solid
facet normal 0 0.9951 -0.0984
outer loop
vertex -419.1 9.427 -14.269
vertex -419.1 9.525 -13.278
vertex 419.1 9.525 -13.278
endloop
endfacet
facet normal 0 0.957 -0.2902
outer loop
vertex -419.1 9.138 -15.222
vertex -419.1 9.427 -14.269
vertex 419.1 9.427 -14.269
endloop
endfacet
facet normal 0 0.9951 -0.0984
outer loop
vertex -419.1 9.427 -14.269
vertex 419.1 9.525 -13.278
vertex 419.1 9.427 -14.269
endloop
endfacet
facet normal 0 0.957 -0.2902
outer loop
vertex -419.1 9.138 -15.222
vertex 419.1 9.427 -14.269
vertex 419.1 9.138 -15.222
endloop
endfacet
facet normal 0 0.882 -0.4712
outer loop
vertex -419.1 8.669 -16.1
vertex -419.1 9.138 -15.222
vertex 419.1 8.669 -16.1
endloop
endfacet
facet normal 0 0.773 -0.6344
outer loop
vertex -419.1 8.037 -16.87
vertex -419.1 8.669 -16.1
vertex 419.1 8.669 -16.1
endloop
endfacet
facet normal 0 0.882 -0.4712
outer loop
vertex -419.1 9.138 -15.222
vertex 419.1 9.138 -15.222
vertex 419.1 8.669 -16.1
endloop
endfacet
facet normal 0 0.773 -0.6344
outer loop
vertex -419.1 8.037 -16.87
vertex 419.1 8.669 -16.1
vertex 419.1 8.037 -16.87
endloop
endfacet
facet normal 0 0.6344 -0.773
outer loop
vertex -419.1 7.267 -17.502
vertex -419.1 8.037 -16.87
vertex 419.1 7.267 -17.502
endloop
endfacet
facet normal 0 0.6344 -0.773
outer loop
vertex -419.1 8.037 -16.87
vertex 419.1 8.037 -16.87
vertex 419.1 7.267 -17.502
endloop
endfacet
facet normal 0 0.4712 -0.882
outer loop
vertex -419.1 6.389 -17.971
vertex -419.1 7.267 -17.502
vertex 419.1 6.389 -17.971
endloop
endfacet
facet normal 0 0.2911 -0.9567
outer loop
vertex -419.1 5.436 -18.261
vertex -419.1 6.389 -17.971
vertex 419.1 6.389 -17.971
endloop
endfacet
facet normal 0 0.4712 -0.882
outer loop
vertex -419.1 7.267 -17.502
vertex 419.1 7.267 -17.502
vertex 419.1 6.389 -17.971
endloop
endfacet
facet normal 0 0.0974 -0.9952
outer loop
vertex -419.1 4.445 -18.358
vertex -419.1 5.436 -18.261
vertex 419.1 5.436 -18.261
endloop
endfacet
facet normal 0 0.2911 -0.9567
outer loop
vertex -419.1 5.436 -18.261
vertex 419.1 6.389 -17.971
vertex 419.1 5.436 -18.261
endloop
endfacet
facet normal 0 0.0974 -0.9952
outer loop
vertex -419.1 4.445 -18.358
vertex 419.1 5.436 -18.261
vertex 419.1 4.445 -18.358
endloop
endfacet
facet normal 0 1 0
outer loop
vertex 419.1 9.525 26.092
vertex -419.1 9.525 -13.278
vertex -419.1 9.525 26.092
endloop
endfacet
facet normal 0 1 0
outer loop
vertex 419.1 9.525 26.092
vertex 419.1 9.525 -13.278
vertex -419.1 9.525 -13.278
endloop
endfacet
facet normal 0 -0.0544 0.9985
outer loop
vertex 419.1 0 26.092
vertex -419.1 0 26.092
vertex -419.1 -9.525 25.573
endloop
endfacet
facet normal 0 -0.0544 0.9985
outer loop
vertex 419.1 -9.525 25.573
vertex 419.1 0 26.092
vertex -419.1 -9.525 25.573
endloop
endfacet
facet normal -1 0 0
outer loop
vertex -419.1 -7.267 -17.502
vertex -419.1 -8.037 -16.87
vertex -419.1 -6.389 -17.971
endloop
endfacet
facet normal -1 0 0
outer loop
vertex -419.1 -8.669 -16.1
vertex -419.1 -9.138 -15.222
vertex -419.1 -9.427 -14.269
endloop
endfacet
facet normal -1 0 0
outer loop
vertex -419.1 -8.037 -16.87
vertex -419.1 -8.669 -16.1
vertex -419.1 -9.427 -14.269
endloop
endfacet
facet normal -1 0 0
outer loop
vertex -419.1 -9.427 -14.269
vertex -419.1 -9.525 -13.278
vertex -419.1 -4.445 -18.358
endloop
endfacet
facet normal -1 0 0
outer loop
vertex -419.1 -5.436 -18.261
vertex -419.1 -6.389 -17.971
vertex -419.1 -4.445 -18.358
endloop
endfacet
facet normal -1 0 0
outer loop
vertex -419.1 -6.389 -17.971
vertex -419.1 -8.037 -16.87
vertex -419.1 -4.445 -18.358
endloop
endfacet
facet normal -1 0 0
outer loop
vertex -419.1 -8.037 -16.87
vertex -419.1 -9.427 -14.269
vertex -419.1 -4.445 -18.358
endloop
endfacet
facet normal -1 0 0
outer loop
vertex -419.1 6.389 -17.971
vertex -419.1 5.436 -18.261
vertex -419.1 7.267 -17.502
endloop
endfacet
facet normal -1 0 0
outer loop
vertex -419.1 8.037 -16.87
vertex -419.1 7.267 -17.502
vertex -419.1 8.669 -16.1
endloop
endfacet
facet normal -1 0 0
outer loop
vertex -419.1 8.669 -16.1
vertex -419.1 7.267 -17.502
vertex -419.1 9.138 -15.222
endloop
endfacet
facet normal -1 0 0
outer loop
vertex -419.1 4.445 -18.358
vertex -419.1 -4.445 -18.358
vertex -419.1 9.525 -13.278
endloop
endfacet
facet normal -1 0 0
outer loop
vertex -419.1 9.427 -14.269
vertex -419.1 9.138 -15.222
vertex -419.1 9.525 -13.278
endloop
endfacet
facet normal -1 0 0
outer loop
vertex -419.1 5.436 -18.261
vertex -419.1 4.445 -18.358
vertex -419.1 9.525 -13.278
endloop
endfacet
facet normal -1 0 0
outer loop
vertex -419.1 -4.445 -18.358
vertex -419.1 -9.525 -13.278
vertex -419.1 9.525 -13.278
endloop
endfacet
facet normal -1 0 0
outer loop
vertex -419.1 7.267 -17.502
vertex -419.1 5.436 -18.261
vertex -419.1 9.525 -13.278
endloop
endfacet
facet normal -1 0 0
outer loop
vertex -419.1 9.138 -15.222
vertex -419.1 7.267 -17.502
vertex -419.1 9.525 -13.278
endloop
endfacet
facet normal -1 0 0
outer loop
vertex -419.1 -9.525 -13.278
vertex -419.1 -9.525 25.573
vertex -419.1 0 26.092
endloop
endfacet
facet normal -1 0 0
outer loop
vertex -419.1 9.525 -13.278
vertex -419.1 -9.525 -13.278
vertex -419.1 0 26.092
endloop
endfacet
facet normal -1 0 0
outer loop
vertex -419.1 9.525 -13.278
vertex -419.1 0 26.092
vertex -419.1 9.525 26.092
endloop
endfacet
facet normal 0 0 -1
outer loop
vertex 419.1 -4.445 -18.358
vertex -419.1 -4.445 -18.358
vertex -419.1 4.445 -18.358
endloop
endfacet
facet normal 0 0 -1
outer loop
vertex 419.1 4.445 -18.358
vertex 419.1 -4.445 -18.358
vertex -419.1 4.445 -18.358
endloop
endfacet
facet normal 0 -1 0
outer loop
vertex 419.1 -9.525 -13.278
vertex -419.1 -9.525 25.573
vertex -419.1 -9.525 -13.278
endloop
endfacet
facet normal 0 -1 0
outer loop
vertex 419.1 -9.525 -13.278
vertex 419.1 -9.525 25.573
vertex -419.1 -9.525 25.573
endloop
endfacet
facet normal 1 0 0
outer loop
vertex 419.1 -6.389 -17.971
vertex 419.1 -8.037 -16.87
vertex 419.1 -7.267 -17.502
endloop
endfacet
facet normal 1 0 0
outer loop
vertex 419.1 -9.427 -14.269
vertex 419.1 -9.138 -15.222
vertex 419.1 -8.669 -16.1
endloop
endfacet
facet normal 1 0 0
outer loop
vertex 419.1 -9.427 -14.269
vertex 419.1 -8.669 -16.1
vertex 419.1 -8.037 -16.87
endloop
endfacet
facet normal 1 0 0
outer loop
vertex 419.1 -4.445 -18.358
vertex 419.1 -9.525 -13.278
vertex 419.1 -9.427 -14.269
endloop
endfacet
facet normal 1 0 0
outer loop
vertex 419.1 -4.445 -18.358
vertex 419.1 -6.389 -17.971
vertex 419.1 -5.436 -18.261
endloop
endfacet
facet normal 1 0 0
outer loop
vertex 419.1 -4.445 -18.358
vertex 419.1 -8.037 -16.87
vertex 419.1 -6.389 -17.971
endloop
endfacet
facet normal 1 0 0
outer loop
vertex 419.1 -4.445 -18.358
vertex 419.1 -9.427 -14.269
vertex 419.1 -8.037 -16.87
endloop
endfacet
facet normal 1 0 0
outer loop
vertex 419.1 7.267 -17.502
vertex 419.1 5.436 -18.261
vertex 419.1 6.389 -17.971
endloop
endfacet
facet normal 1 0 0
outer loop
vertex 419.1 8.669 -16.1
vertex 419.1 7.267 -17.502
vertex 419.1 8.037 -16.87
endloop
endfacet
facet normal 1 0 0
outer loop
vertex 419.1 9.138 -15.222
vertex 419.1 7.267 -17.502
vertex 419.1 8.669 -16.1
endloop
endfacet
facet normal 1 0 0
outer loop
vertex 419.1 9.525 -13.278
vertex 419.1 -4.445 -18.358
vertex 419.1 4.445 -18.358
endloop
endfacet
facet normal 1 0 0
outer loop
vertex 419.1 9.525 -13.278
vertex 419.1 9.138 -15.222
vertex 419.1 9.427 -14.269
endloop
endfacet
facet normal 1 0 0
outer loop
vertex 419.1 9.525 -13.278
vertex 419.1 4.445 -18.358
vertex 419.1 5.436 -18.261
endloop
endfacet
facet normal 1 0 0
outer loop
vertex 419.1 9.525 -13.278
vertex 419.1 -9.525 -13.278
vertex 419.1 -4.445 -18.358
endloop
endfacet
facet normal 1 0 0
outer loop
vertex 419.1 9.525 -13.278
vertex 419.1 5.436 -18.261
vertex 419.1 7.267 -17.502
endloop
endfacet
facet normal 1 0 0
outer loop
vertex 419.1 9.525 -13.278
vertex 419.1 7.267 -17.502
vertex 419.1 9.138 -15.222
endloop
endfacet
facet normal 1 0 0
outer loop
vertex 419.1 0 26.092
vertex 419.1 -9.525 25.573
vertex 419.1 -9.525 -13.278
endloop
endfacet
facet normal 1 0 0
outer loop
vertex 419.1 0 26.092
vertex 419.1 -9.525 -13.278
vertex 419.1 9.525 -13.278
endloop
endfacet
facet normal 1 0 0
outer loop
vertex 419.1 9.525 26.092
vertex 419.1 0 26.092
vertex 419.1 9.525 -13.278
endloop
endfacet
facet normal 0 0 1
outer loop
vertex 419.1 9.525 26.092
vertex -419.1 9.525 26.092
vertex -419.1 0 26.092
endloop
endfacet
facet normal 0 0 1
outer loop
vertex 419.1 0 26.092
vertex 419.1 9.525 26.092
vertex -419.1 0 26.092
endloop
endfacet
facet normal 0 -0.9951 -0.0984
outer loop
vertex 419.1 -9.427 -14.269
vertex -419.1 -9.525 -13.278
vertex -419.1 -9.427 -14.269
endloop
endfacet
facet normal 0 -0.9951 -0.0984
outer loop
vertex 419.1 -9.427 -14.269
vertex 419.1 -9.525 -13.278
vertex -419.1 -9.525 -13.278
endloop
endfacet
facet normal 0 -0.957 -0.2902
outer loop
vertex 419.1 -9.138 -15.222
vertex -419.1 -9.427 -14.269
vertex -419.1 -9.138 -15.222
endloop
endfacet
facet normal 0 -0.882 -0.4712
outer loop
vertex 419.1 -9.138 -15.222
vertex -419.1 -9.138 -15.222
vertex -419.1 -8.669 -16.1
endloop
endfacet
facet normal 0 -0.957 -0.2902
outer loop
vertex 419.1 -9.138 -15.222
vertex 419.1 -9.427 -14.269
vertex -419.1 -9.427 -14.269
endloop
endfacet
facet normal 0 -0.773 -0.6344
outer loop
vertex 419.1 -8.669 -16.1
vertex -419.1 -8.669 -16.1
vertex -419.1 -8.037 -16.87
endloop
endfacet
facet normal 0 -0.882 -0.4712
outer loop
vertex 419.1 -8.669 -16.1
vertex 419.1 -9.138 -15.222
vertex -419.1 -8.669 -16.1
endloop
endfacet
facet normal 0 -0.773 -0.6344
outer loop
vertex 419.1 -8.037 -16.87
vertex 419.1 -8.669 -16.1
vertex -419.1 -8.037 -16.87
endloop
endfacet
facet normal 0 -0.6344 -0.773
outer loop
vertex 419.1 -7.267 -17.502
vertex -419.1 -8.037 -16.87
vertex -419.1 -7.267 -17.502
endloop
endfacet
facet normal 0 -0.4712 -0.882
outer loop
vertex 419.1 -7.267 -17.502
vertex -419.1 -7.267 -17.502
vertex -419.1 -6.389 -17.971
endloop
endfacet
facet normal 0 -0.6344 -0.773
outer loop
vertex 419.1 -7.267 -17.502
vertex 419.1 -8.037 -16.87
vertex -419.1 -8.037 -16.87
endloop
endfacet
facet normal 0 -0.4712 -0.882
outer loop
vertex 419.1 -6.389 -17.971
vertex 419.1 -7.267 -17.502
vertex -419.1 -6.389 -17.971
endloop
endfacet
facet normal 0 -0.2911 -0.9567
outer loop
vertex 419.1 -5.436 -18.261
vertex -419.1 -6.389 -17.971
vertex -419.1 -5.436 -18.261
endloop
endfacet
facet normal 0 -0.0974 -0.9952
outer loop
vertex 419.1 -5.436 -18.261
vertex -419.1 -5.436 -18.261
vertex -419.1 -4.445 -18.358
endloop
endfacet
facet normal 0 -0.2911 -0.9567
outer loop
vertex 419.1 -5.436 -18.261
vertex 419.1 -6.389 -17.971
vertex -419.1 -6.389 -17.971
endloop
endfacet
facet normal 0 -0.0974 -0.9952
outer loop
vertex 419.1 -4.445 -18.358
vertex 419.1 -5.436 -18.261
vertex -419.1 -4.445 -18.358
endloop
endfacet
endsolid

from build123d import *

# Parameters (mm, degrees)
F1_DEPTH      = 419.1
F1_DEPTH_BACK = 419.1
F2_R          = 5.08


with BuildPart() as f1:
    # F0 (on Right) → F1 (new body, two sides)
    with BuildSketch(Plane.YZ) as f1_sk:
        Polygon((-9.525, 25.573289), (-9.525, -18.358187), (9.525, -18.358187), (9.525, 26.091813), (0, 26.091813), align=None)
    extrude(amount=F1_DEPTH)
    extrude(f1_sk.sketch, amount=-F1_DEPTH_BACK)

    # F2
    f2_edges = [f1.edges().sort_by_distance(p)[0] for p in [
        (0, -9.525, -18.358187),
        (0, 9.525, -18.358187),
    ]]
    fillet(f2_edges, radius=F2_R)


solid = f1.part
